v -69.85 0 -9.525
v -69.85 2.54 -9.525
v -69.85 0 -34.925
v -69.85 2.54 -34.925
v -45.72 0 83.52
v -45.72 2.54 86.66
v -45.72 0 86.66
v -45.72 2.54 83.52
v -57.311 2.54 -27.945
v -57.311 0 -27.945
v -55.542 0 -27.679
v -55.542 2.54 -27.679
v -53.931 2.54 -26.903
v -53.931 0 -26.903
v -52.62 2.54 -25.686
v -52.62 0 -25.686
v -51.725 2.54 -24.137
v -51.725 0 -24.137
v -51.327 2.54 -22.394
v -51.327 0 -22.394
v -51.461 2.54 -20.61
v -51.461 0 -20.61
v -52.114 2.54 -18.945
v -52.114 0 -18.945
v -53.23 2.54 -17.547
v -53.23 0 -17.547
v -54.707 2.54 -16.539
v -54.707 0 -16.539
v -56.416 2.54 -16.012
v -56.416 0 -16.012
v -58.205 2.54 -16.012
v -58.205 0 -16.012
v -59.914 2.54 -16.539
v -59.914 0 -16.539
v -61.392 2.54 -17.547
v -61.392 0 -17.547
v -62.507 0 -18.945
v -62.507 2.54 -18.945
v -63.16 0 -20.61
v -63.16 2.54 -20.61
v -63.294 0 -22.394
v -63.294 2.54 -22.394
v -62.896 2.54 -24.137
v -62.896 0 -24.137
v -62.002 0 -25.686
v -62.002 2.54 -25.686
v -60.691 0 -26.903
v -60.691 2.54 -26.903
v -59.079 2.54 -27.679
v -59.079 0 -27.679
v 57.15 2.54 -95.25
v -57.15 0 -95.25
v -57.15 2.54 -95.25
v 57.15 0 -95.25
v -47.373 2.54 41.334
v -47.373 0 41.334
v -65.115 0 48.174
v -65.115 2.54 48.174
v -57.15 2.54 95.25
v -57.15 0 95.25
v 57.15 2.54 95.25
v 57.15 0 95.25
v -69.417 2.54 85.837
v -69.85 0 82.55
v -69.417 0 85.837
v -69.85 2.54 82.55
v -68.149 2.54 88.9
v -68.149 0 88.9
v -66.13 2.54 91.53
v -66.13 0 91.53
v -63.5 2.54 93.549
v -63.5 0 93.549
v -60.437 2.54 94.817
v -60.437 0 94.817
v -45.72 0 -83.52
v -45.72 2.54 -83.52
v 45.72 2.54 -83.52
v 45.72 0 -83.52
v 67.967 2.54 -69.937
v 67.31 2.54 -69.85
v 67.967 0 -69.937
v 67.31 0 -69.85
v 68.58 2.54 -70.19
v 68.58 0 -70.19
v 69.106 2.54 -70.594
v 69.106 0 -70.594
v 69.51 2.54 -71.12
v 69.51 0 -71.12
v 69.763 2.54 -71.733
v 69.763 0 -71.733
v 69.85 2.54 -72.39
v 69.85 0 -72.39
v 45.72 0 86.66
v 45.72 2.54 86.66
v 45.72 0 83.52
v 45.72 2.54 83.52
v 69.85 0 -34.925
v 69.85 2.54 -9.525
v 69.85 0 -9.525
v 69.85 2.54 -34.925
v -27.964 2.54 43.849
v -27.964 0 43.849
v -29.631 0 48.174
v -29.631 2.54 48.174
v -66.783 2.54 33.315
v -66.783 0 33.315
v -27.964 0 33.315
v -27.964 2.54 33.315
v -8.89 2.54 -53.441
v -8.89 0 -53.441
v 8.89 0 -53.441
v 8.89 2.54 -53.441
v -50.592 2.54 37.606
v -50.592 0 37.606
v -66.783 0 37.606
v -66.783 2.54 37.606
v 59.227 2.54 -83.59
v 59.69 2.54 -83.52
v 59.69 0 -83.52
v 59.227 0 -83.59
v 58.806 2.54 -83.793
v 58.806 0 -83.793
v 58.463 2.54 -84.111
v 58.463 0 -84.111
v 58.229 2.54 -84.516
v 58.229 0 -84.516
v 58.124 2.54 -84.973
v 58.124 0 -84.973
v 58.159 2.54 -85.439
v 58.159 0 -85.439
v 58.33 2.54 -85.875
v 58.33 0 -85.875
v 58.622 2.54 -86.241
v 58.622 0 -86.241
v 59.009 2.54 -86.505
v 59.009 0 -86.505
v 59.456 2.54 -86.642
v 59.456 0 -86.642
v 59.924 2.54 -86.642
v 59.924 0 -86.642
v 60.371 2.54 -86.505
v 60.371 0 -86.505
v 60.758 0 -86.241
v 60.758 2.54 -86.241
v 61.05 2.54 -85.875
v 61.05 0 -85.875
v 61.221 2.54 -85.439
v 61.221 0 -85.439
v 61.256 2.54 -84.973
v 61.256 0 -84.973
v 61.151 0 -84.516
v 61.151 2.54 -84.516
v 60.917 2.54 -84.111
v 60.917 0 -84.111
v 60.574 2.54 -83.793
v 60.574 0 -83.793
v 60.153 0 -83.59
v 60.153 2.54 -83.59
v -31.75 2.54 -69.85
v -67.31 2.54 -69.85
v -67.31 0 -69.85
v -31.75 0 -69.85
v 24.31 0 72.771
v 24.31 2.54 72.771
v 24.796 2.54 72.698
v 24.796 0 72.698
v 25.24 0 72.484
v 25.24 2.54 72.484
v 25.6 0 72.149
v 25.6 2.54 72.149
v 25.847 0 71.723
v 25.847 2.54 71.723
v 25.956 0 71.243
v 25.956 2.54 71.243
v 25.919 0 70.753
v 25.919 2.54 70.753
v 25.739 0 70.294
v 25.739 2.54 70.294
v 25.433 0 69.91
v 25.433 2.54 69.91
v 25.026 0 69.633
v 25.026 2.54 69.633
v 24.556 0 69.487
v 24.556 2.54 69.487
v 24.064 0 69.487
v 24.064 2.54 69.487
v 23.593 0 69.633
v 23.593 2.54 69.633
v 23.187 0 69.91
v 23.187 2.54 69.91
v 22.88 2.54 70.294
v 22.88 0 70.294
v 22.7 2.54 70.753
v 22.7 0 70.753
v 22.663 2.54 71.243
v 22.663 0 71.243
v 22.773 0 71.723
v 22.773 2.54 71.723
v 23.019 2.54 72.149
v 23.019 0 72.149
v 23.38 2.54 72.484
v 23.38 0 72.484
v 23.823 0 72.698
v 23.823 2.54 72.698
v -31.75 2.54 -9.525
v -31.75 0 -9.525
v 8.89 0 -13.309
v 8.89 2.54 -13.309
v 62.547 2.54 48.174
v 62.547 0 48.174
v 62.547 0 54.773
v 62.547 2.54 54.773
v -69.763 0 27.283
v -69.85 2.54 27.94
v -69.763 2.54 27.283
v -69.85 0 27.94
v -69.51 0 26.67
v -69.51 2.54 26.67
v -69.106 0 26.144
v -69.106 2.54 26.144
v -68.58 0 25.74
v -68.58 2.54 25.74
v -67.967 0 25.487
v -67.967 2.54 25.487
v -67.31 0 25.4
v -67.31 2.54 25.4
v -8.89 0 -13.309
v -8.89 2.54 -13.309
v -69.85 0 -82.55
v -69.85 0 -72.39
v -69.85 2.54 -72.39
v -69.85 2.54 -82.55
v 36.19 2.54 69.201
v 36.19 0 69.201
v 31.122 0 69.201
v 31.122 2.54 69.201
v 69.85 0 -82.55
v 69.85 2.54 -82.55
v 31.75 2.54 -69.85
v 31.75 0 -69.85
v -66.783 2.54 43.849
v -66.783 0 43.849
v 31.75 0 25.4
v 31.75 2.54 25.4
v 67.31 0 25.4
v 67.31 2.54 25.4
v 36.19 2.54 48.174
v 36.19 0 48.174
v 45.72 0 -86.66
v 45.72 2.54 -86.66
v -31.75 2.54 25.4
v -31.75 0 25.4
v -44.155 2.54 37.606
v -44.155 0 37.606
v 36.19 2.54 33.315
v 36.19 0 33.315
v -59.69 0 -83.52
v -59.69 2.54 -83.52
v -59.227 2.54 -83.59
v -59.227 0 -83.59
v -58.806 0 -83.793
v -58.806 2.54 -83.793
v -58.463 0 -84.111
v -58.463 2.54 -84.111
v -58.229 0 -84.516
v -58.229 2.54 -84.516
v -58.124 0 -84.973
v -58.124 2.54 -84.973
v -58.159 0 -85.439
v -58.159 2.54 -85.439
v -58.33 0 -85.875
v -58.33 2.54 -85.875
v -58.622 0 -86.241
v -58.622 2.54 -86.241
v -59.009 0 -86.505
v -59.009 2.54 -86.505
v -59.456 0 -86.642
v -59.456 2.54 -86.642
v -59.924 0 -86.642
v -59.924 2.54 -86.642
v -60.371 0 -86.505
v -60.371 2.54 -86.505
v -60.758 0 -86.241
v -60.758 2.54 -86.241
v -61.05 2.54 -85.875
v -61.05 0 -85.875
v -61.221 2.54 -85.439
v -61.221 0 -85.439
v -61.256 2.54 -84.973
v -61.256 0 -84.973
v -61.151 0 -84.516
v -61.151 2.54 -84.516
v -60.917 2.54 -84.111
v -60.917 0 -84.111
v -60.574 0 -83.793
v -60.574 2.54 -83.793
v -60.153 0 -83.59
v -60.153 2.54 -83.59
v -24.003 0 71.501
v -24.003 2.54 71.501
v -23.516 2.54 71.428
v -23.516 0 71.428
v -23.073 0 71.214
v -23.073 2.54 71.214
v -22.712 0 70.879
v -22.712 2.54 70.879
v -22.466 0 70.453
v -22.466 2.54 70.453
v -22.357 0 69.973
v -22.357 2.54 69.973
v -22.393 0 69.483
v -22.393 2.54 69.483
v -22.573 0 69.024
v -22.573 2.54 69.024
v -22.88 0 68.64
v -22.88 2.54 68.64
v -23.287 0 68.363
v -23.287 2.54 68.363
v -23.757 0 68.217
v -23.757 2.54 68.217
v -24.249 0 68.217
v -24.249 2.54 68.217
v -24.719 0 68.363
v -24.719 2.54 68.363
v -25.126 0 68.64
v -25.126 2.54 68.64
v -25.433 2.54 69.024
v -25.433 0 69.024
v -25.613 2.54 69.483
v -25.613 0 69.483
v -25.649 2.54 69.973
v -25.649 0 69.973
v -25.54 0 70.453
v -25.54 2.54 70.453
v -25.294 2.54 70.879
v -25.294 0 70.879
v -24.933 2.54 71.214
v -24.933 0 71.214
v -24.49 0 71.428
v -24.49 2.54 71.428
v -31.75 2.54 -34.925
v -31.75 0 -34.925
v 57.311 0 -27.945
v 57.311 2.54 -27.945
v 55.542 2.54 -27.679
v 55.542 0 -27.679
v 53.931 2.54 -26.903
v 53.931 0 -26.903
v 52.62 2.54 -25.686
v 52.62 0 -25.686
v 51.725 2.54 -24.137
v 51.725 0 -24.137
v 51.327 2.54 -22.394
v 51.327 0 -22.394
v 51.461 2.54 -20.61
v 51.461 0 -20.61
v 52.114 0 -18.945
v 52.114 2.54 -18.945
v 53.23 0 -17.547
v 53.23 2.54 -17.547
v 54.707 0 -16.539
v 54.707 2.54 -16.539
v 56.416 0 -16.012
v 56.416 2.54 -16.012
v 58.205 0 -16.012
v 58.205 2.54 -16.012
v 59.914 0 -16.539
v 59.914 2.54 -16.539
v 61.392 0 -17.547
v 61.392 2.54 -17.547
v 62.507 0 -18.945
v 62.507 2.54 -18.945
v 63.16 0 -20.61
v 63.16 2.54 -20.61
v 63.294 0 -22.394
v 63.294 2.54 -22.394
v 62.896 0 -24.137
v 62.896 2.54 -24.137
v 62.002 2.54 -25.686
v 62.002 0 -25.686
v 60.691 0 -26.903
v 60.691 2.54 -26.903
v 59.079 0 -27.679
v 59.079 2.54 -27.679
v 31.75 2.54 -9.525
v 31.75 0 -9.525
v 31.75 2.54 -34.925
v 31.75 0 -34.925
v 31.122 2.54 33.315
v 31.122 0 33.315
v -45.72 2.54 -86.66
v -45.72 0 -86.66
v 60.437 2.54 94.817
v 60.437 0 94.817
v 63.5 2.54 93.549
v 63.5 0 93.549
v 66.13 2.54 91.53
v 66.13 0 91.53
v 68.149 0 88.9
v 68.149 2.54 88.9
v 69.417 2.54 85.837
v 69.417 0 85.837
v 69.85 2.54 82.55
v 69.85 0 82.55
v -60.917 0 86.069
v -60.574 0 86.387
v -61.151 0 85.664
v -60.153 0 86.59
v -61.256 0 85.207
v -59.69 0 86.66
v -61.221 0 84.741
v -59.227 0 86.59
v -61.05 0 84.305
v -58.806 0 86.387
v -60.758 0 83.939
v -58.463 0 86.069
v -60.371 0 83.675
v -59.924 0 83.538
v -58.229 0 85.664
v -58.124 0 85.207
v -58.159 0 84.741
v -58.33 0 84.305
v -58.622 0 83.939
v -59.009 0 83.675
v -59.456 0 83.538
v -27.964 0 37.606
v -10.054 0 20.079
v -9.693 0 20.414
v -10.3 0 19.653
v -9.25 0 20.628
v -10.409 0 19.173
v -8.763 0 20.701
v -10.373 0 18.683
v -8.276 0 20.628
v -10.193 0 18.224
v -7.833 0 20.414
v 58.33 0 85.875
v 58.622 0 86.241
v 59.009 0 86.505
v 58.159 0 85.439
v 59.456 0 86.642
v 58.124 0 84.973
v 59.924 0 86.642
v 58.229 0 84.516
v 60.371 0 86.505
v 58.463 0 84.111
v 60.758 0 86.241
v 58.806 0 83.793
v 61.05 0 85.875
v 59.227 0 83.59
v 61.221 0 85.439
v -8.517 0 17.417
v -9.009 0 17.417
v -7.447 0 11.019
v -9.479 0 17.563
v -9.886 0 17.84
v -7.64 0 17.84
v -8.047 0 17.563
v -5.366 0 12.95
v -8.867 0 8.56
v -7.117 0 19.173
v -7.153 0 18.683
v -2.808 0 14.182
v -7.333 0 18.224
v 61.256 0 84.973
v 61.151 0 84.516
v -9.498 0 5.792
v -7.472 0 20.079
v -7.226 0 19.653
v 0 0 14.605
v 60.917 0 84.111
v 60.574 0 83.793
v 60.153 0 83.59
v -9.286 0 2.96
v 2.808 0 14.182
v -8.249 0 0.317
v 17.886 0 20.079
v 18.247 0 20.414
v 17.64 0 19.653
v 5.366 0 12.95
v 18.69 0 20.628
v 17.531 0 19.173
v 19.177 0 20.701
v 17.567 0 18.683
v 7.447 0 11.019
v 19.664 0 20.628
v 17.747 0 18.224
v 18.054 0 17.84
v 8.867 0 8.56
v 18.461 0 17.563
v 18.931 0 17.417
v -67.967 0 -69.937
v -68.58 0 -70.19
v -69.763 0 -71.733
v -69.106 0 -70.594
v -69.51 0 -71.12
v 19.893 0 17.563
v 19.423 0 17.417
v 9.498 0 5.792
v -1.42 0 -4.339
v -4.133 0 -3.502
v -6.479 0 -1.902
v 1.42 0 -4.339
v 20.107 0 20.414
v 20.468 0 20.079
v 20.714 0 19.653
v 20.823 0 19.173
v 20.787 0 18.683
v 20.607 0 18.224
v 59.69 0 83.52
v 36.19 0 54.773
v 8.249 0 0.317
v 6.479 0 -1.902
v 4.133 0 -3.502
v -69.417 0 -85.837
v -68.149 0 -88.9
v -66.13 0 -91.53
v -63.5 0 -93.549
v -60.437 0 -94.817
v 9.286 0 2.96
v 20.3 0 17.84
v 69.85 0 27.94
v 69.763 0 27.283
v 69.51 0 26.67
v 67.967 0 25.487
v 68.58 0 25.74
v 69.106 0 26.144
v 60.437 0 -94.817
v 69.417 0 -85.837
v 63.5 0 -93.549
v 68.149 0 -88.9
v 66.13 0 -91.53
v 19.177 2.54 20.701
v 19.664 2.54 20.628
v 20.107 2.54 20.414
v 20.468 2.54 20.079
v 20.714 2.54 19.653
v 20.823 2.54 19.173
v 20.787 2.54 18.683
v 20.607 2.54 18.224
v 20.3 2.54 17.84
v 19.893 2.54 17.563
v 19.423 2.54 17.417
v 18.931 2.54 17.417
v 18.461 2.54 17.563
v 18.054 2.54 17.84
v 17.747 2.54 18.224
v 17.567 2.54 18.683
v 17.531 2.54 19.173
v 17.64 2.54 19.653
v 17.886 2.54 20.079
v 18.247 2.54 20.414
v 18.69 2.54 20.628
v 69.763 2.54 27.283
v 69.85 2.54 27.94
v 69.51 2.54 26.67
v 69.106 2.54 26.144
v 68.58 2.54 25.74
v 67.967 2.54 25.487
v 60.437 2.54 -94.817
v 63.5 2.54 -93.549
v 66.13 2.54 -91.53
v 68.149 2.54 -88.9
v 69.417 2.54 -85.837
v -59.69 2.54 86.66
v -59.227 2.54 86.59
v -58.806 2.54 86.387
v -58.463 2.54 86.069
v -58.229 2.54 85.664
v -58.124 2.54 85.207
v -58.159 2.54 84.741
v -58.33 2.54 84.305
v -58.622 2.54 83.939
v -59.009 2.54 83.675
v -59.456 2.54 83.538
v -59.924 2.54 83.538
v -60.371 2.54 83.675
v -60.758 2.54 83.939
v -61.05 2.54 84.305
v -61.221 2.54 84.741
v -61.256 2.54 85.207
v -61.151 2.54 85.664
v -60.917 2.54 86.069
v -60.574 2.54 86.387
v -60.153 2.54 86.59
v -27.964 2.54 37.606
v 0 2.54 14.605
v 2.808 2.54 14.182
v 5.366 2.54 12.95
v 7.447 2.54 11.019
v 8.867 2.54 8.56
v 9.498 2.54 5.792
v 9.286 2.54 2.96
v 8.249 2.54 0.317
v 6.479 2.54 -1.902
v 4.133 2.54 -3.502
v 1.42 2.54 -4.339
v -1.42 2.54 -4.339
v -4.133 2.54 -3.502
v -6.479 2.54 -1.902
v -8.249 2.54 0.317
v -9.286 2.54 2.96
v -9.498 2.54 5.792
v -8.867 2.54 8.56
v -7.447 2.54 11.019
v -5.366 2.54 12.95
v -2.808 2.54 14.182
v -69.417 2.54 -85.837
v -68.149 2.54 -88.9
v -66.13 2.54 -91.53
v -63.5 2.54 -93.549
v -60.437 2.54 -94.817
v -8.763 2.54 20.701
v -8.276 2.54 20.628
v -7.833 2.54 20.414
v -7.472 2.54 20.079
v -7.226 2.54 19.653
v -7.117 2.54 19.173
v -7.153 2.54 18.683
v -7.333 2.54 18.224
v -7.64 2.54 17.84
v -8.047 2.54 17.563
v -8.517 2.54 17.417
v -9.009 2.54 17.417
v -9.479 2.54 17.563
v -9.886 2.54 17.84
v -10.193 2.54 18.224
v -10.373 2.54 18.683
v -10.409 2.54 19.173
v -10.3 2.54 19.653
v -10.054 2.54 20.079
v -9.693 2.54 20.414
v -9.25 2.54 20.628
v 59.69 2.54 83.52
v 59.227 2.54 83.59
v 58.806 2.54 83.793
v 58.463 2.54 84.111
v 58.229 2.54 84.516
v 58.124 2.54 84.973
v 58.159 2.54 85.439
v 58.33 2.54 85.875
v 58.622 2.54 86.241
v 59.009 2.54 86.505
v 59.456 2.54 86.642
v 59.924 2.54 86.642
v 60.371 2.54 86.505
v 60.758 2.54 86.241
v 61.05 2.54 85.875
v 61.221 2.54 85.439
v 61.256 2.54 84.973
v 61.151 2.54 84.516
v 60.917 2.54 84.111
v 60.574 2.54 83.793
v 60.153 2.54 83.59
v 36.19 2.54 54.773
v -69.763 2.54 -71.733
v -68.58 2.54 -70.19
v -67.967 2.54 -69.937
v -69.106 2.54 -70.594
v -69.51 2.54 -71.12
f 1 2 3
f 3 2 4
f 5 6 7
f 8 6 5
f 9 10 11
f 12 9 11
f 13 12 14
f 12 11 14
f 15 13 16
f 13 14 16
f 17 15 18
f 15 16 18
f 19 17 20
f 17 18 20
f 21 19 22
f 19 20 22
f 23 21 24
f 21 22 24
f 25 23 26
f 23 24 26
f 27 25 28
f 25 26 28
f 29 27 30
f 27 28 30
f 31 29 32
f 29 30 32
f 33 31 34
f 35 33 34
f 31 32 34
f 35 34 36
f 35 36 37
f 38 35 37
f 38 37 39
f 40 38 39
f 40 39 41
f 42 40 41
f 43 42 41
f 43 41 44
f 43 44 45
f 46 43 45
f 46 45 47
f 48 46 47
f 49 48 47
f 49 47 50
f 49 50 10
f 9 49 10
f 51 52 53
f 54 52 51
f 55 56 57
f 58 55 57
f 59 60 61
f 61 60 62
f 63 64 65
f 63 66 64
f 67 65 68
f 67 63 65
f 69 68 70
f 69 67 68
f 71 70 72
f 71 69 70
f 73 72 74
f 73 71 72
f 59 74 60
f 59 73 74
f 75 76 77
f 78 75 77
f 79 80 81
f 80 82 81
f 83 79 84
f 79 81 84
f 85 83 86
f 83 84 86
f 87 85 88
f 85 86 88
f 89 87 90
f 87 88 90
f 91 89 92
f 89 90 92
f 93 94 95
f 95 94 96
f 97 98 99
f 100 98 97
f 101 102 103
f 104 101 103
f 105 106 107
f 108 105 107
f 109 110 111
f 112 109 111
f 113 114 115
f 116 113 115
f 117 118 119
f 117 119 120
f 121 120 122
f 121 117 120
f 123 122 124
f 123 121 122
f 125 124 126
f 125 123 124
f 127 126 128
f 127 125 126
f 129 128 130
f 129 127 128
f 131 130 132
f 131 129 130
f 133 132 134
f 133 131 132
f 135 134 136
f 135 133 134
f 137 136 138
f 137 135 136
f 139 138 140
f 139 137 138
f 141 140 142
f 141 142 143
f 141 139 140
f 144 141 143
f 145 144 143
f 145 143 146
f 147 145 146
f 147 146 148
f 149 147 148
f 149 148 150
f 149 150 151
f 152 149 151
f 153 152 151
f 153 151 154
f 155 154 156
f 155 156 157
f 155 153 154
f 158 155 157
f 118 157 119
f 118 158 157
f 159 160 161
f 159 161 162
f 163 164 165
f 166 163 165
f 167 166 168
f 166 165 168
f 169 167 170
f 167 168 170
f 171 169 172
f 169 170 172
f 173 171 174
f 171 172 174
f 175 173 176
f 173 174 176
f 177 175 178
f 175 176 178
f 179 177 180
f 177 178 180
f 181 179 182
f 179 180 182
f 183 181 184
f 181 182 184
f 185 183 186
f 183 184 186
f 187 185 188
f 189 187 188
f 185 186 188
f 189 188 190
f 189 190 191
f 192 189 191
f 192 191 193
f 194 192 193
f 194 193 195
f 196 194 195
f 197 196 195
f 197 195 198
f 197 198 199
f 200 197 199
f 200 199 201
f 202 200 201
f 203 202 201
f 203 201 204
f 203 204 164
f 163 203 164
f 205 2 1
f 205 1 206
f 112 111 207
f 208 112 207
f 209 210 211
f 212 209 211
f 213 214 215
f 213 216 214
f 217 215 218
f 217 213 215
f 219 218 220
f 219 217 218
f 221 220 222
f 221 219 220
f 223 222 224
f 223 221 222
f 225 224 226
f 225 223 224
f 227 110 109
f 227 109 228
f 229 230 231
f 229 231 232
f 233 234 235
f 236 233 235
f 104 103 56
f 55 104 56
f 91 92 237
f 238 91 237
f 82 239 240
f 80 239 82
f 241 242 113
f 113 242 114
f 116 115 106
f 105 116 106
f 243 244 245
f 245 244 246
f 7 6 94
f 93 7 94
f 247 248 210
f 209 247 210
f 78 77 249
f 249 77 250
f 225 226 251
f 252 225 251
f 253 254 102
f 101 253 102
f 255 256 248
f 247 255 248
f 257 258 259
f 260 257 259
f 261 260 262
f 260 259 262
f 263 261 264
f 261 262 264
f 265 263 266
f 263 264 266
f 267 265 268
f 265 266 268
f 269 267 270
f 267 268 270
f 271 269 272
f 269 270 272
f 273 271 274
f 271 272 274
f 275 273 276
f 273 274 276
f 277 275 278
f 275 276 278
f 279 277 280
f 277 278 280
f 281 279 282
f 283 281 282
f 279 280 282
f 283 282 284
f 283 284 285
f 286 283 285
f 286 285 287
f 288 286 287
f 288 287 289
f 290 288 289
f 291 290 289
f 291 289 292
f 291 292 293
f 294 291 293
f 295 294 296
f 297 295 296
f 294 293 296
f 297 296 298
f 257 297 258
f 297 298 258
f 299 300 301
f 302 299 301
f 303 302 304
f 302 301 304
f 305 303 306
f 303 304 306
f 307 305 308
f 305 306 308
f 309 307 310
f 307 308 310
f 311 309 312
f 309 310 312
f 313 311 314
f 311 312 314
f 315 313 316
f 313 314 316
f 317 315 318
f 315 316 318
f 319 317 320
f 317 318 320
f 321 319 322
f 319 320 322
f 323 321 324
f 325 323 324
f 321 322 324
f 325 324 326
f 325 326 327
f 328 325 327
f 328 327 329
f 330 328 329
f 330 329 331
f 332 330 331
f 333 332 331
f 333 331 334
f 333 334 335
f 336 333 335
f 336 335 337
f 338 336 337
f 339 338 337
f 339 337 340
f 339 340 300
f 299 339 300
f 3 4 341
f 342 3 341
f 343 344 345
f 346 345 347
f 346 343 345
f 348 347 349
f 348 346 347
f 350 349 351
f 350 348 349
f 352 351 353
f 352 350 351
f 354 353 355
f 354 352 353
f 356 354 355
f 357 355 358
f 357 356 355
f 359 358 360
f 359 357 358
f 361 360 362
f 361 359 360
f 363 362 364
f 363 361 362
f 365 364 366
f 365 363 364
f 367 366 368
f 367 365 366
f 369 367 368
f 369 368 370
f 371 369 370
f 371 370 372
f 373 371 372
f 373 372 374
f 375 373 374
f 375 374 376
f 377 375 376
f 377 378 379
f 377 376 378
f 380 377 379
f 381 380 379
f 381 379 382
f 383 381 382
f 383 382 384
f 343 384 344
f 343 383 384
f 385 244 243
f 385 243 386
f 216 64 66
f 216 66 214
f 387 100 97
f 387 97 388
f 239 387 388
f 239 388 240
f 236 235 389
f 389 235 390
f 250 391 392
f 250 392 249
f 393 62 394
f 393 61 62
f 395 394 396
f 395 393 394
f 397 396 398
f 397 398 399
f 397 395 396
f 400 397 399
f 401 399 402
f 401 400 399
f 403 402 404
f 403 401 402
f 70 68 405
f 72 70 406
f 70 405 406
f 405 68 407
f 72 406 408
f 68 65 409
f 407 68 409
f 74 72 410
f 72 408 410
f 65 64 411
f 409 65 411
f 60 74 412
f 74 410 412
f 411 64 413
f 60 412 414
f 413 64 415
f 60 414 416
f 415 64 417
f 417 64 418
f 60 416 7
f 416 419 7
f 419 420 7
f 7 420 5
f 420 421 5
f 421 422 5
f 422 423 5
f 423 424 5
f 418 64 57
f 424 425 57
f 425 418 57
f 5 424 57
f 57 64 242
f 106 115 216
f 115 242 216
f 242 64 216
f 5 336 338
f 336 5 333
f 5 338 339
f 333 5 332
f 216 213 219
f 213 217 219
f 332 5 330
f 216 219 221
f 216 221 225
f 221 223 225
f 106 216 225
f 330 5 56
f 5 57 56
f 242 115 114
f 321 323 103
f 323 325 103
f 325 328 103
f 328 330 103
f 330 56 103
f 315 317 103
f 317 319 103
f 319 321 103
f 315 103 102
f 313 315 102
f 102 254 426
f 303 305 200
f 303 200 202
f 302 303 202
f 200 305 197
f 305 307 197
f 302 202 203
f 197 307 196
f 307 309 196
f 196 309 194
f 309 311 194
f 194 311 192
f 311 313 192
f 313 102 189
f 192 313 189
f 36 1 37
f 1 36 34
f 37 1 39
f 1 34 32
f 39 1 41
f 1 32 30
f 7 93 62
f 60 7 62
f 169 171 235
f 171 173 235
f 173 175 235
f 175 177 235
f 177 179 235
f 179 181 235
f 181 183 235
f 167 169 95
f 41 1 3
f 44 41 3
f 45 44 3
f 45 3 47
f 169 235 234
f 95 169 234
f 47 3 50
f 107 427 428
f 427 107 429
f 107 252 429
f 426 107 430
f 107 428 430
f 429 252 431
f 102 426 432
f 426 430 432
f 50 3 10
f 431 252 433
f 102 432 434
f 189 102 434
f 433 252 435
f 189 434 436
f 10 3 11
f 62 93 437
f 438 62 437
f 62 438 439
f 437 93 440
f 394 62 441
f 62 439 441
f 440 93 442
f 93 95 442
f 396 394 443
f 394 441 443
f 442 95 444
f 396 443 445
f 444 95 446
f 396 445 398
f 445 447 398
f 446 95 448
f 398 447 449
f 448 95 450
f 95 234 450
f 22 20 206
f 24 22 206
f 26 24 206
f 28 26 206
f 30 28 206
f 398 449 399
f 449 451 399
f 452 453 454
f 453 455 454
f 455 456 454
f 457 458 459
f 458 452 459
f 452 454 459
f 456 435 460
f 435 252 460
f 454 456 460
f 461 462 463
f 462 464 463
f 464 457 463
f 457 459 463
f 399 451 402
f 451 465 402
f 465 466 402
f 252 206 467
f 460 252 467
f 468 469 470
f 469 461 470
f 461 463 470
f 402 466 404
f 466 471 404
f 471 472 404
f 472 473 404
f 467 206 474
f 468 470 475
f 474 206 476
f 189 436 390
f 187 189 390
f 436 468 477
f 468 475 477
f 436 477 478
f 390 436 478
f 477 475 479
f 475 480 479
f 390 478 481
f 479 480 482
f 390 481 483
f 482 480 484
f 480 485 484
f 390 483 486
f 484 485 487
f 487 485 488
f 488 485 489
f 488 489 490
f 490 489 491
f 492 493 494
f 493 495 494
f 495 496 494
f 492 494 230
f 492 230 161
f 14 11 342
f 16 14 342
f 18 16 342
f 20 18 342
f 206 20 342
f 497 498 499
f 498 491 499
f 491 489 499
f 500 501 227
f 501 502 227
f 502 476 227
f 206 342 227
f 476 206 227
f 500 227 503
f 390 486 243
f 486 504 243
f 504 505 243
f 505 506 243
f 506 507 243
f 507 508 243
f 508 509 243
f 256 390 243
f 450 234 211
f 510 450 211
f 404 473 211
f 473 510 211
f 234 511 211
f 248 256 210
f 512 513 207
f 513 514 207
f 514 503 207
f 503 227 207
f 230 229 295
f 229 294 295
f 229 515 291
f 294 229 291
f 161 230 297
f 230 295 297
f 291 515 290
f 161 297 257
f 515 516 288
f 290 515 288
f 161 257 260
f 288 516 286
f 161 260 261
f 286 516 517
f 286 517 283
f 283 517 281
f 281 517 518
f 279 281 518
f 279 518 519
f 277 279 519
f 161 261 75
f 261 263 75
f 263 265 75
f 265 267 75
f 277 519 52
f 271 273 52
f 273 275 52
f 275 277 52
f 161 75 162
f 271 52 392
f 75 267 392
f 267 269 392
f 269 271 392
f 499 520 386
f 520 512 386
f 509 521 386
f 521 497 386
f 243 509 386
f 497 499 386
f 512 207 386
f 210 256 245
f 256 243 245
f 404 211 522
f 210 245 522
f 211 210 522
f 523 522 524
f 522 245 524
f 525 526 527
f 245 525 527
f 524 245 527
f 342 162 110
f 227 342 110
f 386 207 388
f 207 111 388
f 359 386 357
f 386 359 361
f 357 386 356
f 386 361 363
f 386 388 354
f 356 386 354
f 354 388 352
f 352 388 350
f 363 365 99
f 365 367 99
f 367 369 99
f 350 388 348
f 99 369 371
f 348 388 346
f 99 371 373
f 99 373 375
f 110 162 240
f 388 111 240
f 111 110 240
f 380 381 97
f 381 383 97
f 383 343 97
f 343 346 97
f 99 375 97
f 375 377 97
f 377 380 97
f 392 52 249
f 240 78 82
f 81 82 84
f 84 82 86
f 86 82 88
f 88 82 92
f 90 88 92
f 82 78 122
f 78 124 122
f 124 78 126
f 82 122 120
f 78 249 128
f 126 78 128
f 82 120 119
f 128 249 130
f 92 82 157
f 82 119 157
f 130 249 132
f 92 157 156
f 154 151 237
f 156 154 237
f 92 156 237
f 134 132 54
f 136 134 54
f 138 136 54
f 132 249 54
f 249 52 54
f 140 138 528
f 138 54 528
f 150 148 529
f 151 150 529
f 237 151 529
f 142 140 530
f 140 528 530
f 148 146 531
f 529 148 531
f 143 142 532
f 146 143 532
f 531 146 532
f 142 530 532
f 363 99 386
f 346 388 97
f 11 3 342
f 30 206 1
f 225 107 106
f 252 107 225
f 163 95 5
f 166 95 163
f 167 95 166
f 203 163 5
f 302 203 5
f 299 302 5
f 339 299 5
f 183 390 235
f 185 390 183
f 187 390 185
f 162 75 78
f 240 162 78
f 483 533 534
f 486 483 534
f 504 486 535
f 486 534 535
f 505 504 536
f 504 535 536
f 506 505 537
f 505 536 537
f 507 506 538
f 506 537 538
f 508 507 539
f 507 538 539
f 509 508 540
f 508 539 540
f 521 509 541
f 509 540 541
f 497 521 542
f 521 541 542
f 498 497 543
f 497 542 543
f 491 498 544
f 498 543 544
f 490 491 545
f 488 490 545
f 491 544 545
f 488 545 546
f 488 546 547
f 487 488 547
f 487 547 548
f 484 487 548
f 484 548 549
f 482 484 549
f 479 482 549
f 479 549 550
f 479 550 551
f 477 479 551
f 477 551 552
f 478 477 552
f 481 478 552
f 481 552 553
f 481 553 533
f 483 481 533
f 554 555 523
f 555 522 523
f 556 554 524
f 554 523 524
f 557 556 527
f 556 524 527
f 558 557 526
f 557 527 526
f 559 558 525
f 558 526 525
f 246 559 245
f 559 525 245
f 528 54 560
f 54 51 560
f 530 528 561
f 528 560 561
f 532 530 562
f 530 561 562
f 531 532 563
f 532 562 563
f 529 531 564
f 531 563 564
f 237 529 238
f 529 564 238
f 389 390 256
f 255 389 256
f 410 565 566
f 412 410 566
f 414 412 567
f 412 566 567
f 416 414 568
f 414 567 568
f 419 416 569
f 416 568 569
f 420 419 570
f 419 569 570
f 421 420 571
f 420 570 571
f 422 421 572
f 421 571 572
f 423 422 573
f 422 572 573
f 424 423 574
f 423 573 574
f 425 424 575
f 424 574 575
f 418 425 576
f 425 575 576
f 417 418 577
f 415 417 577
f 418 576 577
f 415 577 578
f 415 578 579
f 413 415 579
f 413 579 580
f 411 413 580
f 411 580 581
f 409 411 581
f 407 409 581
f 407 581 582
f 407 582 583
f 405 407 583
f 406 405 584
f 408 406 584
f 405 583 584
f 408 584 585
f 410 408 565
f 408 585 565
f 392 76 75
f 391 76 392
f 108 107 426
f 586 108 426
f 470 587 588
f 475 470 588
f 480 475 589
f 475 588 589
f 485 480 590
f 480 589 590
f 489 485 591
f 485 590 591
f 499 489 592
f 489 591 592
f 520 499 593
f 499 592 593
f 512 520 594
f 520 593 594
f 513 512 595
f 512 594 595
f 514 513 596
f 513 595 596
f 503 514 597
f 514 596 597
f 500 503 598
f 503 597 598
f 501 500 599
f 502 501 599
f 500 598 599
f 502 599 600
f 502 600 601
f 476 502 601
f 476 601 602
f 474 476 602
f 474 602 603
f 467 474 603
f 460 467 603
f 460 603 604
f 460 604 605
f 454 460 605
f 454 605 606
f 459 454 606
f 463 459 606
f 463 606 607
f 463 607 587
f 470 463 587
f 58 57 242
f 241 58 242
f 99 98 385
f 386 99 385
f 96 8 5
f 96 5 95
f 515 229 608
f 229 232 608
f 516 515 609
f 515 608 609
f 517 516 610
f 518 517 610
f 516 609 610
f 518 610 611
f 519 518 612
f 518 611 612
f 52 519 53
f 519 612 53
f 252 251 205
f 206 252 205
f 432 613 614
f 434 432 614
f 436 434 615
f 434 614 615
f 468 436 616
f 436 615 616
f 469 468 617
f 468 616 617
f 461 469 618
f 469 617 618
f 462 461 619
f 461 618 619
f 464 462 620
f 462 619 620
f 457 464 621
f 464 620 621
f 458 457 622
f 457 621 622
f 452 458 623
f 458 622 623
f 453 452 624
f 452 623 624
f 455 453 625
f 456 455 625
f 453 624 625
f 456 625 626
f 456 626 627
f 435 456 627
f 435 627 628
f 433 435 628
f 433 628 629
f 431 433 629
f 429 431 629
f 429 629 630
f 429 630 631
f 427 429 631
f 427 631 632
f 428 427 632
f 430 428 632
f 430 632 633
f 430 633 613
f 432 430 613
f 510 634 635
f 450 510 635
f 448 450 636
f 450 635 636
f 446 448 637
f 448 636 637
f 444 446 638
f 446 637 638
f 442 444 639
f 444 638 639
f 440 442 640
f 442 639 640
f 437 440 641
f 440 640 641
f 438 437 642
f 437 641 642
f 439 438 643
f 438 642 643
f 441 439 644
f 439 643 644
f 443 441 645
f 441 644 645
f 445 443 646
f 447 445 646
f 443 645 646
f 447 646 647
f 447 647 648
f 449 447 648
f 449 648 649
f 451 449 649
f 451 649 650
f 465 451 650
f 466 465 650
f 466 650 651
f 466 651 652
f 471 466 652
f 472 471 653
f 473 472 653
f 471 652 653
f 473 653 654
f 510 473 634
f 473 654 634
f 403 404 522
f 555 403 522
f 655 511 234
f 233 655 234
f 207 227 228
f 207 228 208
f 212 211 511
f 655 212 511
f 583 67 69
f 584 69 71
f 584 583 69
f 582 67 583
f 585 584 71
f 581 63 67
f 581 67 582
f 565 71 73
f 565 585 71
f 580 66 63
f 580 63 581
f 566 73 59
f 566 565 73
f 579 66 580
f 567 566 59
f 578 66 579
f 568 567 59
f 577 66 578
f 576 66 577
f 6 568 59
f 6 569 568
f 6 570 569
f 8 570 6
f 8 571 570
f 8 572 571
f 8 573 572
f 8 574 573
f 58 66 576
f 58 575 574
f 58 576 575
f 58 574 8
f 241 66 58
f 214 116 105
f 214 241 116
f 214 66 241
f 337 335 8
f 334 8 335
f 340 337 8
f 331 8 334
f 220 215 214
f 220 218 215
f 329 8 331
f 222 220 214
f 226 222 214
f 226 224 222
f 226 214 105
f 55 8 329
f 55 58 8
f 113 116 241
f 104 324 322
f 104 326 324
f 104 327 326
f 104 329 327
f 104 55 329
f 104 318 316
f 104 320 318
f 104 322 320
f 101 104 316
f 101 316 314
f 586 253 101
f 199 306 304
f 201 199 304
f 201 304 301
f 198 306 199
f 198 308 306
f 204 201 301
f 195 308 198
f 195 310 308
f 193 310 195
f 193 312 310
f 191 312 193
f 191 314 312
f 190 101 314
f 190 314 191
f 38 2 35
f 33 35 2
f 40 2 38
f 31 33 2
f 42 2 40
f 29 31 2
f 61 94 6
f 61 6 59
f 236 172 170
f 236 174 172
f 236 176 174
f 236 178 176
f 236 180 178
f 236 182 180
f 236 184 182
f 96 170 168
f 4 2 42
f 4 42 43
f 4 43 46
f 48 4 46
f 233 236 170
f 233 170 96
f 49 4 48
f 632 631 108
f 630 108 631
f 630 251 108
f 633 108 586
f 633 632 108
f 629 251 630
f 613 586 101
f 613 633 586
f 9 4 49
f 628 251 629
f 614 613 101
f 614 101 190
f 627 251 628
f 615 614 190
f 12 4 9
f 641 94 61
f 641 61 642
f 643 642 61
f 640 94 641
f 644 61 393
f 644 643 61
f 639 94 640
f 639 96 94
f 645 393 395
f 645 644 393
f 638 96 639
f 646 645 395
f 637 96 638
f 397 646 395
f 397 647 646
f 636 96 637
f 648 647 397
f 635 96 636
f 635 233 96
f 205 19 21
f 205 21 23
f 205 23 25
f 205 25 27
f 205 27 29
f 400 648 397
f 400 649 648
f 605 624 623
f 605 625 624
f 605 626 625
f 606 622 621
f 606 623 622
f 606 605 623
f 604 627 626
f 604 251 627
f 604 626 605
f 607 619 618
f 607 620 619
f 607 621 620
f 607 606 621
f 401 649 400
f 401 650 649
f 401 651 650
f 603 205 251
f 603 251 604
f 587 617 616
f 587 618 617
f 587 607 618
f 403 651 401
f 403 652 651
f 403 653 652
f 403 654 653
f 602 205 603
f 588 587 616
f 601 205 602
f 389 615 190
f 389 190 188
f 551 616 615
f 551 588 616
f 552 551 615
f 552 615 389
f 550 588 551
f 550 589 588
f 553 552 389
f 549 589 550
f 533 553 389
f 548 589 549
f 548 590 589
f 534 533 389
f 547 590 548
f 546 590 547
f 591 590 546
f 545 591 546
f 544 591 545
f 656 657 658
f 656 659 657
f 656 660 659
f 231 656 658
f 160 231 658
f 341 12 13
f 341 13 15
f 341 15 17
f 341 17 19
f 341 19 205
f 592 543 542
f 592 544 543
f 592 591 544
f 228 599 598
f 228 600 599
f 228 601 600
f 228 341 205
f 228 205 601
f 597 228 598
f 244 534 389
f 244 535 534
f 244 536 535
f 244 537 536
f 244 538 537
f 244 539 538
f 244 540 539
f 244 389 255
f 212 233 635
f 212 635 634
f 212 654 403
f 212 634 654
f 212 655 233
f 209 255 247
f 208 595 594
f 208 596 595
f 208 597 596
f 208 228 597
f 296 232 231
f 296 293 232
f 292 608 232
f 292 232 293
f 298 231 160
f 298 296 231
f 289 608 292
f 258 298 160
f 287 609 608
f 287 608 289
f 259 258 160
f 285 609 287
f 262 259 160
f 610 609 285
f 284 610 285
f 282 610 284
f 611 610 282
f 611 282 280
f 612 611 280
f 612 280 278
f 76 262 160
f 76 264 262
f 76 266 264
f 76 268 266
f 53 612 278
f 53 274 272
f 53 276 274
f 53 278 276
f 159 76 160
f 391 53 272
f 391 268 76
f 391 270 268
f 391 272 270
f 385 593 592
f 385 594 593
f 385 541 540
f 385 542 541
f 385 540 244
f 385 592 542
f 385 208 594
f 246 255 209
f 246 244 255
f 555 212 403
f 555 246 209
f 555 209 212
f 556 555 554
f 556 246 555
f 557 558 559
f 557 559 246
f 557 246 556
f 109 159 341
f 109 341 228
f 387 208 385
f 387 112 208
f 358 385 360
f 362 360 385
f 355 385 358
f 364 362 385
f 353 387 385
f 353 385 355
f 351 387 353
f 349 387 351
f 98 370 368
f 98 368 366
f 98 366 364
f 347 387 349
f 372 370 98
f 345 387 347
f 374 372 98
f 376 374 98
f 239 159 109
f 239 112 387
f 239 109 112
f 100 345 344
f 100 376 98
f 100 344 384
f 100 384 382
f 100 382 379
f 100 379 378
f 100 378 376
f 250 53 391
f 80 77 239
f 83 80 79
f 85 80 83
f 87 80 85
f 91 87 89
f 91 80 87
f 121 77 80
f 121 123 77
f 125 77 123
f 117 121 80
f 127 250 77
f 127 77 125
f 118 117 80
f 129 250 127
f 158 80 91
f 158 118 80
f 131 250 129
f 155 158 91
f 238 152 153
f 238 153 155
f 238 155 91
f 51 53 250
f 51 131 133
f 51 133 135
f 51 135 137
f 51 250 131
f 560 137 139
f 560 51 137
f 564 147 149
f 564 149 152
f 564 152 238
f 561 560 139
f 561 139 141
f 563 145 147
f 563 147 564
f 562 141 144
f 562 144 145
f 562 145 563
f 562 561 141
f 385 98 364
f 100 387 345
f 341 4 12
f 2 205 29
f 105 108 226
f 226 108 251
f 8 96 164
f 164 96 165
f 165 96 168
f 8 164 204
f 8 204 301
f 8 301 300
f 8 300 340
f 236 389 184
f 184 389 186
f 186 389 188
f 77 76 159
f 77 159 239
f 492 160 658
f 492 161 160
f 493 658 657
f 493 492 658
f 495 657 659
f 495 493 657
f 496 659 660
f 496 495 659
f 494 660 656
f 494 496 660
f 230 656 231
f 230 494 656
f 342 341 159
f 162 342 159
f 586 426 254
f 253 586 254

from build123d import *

# Parameters (mm, degrees)
SKETCH2_W                    = 139.7
SKETCH2_H                    = 190.5
BASE_PLATE_DEPTH             = 2.54
SKETCH5_W                    = 38.1
SKETCH5_H                    = 95.25
STEERING_WHEELS_HOLES_DEPTH  = 6.35
FILLET1_R                    = 12.7
FILLET2_R                    = 2.54
SKETCH18_R                   = 1.651
HOLES_FOR_ARDUINO_UNO_DEPTH  = 119.144134852
SKETCH20_R                   = 9.525
CUTOUT_FOR_MOTOR_WIRES_DEPTH = 119.144134852
SKETCH24_R                   = 1.57
CUT_EXTRUDE1_DEPTH           = 2.54
SKETCH25_R                   = 1.57
CUT_EXTRUDE3_DEPTH           = 2.54
SKETCH27_W                   = 91.44
SKETCH27_H                   = 3.14
CUT_EXTRUDE4_DEPTH           = 2.54
SKETCH28_W                   = 38.1
SKETCH28_H                   = 25.4
BOSS_EXTRUDE1_DEPTH          = 2.54
SKETCH29_R                   = 6
CUT_EXTRUDE5_DEPTH           = 119.144134852
SKETCH30_W                   = 17.78
SKETCH30_H                   = 40.132
CUT_EXTRUDE6_DEPTH           = 119.144134852
CUT_EXTRUDE7_DEPTH           = 2.54


with BuildPart() as part:
    # Sketch2 → Base Plate (new body)
    with BuildSketch(Plane(origin=(0, 0, 0), x_dir=(1, 0, 0), z_dir=(0, 1, 0))):
        Rectangle(SKETCH2_W, SKETCH2_H)
    extrude(amount=BASE_PLATE_DEPTH)

    # Sketch5 → Steering Wheels Holes (cut)
    with BuildSketch(Plane(origin=(0, 2.54, 0), x_dir=(1, 0, 0), z_dir=(0, 1, 0))):
        with Locations((-50.8, 22.225)):
            Rectangle(SKETCH5_W, SKETCH5_H)
        with Locations((50.8, 22.225)):
            Rectangle(SKETCH5_W, SKETCH5_H)
    extrude(amount=-STEERING_WHEELS_HOLES_DEPTH, mode=Mode.SUBTRACT)

    # Fillet1
    fillet1_edges = [part.edges().sort_by_distance(p)[0] for p in [
        (69.85, 1.27, 95.25),
        (-69.85, 1.27, 95.25),
        (-69.85, 1.27, -95.25),
        (69.85, 1.27, -95.25),
    ]]
    fillet(fillet1_edges, radius=FILLET1_R)

    # Fillet2
    fillet2_edges = [part.edges().sort_by_distance(p)[0] for p in [
        (-69.85, 1.27, 25.4),
        (-69.85, 1.27, -69.85),
        (69.85, 1.27, -69.85),
        (69.85, 1.27, 25.4),
    ]]
    fillet(fillet2_edges, radius=FILLET2_R)

    # Sketch18 → Holes for Arduino UNO (cut, through all)
    with BuildSketch(Plane(origin=(0, 2.54, 0), x_dir=(1, 0, 0), z_dir=(0, 1, 0))):
        with Locations(Location((-8.763, -19.05, 0), (0, 0, 270))):
            Circle(SKETCH18_R)
        with Locations(Location((19.177, -19.05, 0), (0, 0, 270))):
            Circle(SKETCH18_R)
        with Locations(Location((-24.003, -69.85, 0), (0, 0, 270))):
            Circle(SKETCH18_R)
        with Locations(Location((24.309664393, -71.12, 0), (0, 0, 270))):
            Circle(SKETCH18_R)
    extrude(amount=-HOLES_FOR_ARDUINO_UNO_DEPTH, mode=Mode.SUBTRACT)

    # Sketch20 → Cutout for motor wires (cut, through all)
    with BuildSketch(Plane(origin=(0, 2.54, 0), x_dir=(1, 0, 0), z_dir=(0, 1, 0))):
        with Locations(Location((0, -5.08, 0), (0, 0, 270))):
            Circle(SKETCH20_R)
    extrude(amount=-CUTOUT_FOR_MOTOR_WIRES_DEPTH, mode=Mode.SUBTRACT)

    # Sketch24 → Cut-Extrude1 (cut)
    with BuildSketch(Plane(origin=(0, 2.54, 0), x_dir=(1, 0, 0), z_dir=(0, 1, 0))):
        with Locations(Location((-59.69, 85.09, 0), (0, 0, 270))):
            Circle(SKETCH24_R)
    cut_extrude1 = extrude(amount=-CUT_EXTRUDE1_DEPTH, mode=Mode.SUBTRACT)

    # Mirror1: Cut-Extrude1 across plane
    add(cut_extrude1.mirror(Plane(origin=(0, 0, 0), x_dir=(0, 0, 1), z_dir=(1, 0, 0))), mode=Mode.SUBTRACT)

    # Sketch25 → Cut-Extrude3 (cut)
    with BuildSketch(Plane(origin=(0, 2.54, 0), x_dir=(1, 0, 0), z_dir=(0, 1, 0))):
        with Locations(Location((-59.69, -85.09, 0), (0, 0, 270))):
            Circle(SKETCH25_R)
        with Locations(Location((59.69, -85.09, 0), (0, 0, 90))):
            Circle(SKETCH25_R)
    extrude(amount=-CUT_EXTRUDE3_DEPTH, mode=Mode.SUBTRACT)

    # Sketch27 → Cut-Extrude4 (cut)
    with BuildSketch(Plane(origin=(0, 2.54, 0), x_dir=(1, 0, 0), z_dir=(0, 1, 0))):
        with Locations((0, -85.09)):
            Rectangle(SKETCH27_W, SKETCH27_H)
        with Locations((0, 85.09)):
            Rectangle(SKETCH27_W, SKETCH27_H)
    extrude(amount=-CUT_EXTRUDE4_DEPTH, mode=Mode.SUBTRACT)

    # Sketch28 → Boss-Extrude1 (add, through all)
    with BuildSketch(Plane(origin=(0, 2.54, 0), x_dir=(1, 0, 0), z_dir=(0, 1, 0))):
        with Locations((-50.8, 22.225)):
            Rectangle(SKETCH28_W, SKETCH28_H)
    boss_extrude1 = extrude(amount=-BOSS_EXTRUDE1_DEPTH)

    # Mirror2: Boss-Extrude1 across plane
    add(boss_extrude1.mirror(Plane(origin=(0, 0, 0), x_dir=(0, 0, 1), z_dir=(1, 0, 0))))

    # Sketch29 → Cut-Extrude5 (cut, through all)
    with BuildSketch(Plane.XZ):
        with Locations(Location((-57.3106296, -21.945186919, 0), (0, 0, 270))):
            Circle(SKETCH29_R)
    cut_extrude5 = extrude(amount=-CUT_EXTRUDE5_DEPTH, mode=Mode.SUBTRACT)

    # Mirror3: Cut-Extrude5 across plane
    add(cut_extrude5.mirror(Plane(origin=(0, 0, 0), x_dir=(0, 0, 1), z_dir=(1, 0, 0))), mode=Mode.SUBTRACT)

    # Sketch30 → Cut-Extrude6 (cut, through all)
    with BuildSketch(Plane.XZ):
        with Locations((0, -33.375186919)):
            Rectangle(SKETCH30_W, SKETCH30_H)
    extrude(amount=-CUT_EXTRUDE6_DEPTH, mode=Mode.SUBTRACT)

    # Sketch31 → Cut-Extrude7 (cut)
    with BuildSketch(Plane.XZ):
        Polygon((-66.782826822, 33.314746009), (-27.963596323, 33.314746009), (-27.963596323, 37.60631923), (-44.154531657, 37.60631923), (-27.963596323, 43.848607552), (-29.63125682, 48.174101966), (-47.373211572, 41.333830254), (-65.115166325, 48.174101966), (-66.782826822, 43.848607552), (-50.591891488, 37.60631923), (-66.782826822, 37.60631923), align=None)
        Polygon((31.121508027, 33.314746009), (36.190157542, 33.314746009), (36.190157542, 48.174101966), (62.547135024, 48.174101966), (62.547135024, 54.772612114), (36.190157542, 54.772612114), (36.190157542, 69.200784581), (31.121508027, 69.200784581), align=None)
    extrude(amount=-CUT_EXTRUDE7_DEPTH, mode=Mode.SUBTRACT)


solid = part.part
